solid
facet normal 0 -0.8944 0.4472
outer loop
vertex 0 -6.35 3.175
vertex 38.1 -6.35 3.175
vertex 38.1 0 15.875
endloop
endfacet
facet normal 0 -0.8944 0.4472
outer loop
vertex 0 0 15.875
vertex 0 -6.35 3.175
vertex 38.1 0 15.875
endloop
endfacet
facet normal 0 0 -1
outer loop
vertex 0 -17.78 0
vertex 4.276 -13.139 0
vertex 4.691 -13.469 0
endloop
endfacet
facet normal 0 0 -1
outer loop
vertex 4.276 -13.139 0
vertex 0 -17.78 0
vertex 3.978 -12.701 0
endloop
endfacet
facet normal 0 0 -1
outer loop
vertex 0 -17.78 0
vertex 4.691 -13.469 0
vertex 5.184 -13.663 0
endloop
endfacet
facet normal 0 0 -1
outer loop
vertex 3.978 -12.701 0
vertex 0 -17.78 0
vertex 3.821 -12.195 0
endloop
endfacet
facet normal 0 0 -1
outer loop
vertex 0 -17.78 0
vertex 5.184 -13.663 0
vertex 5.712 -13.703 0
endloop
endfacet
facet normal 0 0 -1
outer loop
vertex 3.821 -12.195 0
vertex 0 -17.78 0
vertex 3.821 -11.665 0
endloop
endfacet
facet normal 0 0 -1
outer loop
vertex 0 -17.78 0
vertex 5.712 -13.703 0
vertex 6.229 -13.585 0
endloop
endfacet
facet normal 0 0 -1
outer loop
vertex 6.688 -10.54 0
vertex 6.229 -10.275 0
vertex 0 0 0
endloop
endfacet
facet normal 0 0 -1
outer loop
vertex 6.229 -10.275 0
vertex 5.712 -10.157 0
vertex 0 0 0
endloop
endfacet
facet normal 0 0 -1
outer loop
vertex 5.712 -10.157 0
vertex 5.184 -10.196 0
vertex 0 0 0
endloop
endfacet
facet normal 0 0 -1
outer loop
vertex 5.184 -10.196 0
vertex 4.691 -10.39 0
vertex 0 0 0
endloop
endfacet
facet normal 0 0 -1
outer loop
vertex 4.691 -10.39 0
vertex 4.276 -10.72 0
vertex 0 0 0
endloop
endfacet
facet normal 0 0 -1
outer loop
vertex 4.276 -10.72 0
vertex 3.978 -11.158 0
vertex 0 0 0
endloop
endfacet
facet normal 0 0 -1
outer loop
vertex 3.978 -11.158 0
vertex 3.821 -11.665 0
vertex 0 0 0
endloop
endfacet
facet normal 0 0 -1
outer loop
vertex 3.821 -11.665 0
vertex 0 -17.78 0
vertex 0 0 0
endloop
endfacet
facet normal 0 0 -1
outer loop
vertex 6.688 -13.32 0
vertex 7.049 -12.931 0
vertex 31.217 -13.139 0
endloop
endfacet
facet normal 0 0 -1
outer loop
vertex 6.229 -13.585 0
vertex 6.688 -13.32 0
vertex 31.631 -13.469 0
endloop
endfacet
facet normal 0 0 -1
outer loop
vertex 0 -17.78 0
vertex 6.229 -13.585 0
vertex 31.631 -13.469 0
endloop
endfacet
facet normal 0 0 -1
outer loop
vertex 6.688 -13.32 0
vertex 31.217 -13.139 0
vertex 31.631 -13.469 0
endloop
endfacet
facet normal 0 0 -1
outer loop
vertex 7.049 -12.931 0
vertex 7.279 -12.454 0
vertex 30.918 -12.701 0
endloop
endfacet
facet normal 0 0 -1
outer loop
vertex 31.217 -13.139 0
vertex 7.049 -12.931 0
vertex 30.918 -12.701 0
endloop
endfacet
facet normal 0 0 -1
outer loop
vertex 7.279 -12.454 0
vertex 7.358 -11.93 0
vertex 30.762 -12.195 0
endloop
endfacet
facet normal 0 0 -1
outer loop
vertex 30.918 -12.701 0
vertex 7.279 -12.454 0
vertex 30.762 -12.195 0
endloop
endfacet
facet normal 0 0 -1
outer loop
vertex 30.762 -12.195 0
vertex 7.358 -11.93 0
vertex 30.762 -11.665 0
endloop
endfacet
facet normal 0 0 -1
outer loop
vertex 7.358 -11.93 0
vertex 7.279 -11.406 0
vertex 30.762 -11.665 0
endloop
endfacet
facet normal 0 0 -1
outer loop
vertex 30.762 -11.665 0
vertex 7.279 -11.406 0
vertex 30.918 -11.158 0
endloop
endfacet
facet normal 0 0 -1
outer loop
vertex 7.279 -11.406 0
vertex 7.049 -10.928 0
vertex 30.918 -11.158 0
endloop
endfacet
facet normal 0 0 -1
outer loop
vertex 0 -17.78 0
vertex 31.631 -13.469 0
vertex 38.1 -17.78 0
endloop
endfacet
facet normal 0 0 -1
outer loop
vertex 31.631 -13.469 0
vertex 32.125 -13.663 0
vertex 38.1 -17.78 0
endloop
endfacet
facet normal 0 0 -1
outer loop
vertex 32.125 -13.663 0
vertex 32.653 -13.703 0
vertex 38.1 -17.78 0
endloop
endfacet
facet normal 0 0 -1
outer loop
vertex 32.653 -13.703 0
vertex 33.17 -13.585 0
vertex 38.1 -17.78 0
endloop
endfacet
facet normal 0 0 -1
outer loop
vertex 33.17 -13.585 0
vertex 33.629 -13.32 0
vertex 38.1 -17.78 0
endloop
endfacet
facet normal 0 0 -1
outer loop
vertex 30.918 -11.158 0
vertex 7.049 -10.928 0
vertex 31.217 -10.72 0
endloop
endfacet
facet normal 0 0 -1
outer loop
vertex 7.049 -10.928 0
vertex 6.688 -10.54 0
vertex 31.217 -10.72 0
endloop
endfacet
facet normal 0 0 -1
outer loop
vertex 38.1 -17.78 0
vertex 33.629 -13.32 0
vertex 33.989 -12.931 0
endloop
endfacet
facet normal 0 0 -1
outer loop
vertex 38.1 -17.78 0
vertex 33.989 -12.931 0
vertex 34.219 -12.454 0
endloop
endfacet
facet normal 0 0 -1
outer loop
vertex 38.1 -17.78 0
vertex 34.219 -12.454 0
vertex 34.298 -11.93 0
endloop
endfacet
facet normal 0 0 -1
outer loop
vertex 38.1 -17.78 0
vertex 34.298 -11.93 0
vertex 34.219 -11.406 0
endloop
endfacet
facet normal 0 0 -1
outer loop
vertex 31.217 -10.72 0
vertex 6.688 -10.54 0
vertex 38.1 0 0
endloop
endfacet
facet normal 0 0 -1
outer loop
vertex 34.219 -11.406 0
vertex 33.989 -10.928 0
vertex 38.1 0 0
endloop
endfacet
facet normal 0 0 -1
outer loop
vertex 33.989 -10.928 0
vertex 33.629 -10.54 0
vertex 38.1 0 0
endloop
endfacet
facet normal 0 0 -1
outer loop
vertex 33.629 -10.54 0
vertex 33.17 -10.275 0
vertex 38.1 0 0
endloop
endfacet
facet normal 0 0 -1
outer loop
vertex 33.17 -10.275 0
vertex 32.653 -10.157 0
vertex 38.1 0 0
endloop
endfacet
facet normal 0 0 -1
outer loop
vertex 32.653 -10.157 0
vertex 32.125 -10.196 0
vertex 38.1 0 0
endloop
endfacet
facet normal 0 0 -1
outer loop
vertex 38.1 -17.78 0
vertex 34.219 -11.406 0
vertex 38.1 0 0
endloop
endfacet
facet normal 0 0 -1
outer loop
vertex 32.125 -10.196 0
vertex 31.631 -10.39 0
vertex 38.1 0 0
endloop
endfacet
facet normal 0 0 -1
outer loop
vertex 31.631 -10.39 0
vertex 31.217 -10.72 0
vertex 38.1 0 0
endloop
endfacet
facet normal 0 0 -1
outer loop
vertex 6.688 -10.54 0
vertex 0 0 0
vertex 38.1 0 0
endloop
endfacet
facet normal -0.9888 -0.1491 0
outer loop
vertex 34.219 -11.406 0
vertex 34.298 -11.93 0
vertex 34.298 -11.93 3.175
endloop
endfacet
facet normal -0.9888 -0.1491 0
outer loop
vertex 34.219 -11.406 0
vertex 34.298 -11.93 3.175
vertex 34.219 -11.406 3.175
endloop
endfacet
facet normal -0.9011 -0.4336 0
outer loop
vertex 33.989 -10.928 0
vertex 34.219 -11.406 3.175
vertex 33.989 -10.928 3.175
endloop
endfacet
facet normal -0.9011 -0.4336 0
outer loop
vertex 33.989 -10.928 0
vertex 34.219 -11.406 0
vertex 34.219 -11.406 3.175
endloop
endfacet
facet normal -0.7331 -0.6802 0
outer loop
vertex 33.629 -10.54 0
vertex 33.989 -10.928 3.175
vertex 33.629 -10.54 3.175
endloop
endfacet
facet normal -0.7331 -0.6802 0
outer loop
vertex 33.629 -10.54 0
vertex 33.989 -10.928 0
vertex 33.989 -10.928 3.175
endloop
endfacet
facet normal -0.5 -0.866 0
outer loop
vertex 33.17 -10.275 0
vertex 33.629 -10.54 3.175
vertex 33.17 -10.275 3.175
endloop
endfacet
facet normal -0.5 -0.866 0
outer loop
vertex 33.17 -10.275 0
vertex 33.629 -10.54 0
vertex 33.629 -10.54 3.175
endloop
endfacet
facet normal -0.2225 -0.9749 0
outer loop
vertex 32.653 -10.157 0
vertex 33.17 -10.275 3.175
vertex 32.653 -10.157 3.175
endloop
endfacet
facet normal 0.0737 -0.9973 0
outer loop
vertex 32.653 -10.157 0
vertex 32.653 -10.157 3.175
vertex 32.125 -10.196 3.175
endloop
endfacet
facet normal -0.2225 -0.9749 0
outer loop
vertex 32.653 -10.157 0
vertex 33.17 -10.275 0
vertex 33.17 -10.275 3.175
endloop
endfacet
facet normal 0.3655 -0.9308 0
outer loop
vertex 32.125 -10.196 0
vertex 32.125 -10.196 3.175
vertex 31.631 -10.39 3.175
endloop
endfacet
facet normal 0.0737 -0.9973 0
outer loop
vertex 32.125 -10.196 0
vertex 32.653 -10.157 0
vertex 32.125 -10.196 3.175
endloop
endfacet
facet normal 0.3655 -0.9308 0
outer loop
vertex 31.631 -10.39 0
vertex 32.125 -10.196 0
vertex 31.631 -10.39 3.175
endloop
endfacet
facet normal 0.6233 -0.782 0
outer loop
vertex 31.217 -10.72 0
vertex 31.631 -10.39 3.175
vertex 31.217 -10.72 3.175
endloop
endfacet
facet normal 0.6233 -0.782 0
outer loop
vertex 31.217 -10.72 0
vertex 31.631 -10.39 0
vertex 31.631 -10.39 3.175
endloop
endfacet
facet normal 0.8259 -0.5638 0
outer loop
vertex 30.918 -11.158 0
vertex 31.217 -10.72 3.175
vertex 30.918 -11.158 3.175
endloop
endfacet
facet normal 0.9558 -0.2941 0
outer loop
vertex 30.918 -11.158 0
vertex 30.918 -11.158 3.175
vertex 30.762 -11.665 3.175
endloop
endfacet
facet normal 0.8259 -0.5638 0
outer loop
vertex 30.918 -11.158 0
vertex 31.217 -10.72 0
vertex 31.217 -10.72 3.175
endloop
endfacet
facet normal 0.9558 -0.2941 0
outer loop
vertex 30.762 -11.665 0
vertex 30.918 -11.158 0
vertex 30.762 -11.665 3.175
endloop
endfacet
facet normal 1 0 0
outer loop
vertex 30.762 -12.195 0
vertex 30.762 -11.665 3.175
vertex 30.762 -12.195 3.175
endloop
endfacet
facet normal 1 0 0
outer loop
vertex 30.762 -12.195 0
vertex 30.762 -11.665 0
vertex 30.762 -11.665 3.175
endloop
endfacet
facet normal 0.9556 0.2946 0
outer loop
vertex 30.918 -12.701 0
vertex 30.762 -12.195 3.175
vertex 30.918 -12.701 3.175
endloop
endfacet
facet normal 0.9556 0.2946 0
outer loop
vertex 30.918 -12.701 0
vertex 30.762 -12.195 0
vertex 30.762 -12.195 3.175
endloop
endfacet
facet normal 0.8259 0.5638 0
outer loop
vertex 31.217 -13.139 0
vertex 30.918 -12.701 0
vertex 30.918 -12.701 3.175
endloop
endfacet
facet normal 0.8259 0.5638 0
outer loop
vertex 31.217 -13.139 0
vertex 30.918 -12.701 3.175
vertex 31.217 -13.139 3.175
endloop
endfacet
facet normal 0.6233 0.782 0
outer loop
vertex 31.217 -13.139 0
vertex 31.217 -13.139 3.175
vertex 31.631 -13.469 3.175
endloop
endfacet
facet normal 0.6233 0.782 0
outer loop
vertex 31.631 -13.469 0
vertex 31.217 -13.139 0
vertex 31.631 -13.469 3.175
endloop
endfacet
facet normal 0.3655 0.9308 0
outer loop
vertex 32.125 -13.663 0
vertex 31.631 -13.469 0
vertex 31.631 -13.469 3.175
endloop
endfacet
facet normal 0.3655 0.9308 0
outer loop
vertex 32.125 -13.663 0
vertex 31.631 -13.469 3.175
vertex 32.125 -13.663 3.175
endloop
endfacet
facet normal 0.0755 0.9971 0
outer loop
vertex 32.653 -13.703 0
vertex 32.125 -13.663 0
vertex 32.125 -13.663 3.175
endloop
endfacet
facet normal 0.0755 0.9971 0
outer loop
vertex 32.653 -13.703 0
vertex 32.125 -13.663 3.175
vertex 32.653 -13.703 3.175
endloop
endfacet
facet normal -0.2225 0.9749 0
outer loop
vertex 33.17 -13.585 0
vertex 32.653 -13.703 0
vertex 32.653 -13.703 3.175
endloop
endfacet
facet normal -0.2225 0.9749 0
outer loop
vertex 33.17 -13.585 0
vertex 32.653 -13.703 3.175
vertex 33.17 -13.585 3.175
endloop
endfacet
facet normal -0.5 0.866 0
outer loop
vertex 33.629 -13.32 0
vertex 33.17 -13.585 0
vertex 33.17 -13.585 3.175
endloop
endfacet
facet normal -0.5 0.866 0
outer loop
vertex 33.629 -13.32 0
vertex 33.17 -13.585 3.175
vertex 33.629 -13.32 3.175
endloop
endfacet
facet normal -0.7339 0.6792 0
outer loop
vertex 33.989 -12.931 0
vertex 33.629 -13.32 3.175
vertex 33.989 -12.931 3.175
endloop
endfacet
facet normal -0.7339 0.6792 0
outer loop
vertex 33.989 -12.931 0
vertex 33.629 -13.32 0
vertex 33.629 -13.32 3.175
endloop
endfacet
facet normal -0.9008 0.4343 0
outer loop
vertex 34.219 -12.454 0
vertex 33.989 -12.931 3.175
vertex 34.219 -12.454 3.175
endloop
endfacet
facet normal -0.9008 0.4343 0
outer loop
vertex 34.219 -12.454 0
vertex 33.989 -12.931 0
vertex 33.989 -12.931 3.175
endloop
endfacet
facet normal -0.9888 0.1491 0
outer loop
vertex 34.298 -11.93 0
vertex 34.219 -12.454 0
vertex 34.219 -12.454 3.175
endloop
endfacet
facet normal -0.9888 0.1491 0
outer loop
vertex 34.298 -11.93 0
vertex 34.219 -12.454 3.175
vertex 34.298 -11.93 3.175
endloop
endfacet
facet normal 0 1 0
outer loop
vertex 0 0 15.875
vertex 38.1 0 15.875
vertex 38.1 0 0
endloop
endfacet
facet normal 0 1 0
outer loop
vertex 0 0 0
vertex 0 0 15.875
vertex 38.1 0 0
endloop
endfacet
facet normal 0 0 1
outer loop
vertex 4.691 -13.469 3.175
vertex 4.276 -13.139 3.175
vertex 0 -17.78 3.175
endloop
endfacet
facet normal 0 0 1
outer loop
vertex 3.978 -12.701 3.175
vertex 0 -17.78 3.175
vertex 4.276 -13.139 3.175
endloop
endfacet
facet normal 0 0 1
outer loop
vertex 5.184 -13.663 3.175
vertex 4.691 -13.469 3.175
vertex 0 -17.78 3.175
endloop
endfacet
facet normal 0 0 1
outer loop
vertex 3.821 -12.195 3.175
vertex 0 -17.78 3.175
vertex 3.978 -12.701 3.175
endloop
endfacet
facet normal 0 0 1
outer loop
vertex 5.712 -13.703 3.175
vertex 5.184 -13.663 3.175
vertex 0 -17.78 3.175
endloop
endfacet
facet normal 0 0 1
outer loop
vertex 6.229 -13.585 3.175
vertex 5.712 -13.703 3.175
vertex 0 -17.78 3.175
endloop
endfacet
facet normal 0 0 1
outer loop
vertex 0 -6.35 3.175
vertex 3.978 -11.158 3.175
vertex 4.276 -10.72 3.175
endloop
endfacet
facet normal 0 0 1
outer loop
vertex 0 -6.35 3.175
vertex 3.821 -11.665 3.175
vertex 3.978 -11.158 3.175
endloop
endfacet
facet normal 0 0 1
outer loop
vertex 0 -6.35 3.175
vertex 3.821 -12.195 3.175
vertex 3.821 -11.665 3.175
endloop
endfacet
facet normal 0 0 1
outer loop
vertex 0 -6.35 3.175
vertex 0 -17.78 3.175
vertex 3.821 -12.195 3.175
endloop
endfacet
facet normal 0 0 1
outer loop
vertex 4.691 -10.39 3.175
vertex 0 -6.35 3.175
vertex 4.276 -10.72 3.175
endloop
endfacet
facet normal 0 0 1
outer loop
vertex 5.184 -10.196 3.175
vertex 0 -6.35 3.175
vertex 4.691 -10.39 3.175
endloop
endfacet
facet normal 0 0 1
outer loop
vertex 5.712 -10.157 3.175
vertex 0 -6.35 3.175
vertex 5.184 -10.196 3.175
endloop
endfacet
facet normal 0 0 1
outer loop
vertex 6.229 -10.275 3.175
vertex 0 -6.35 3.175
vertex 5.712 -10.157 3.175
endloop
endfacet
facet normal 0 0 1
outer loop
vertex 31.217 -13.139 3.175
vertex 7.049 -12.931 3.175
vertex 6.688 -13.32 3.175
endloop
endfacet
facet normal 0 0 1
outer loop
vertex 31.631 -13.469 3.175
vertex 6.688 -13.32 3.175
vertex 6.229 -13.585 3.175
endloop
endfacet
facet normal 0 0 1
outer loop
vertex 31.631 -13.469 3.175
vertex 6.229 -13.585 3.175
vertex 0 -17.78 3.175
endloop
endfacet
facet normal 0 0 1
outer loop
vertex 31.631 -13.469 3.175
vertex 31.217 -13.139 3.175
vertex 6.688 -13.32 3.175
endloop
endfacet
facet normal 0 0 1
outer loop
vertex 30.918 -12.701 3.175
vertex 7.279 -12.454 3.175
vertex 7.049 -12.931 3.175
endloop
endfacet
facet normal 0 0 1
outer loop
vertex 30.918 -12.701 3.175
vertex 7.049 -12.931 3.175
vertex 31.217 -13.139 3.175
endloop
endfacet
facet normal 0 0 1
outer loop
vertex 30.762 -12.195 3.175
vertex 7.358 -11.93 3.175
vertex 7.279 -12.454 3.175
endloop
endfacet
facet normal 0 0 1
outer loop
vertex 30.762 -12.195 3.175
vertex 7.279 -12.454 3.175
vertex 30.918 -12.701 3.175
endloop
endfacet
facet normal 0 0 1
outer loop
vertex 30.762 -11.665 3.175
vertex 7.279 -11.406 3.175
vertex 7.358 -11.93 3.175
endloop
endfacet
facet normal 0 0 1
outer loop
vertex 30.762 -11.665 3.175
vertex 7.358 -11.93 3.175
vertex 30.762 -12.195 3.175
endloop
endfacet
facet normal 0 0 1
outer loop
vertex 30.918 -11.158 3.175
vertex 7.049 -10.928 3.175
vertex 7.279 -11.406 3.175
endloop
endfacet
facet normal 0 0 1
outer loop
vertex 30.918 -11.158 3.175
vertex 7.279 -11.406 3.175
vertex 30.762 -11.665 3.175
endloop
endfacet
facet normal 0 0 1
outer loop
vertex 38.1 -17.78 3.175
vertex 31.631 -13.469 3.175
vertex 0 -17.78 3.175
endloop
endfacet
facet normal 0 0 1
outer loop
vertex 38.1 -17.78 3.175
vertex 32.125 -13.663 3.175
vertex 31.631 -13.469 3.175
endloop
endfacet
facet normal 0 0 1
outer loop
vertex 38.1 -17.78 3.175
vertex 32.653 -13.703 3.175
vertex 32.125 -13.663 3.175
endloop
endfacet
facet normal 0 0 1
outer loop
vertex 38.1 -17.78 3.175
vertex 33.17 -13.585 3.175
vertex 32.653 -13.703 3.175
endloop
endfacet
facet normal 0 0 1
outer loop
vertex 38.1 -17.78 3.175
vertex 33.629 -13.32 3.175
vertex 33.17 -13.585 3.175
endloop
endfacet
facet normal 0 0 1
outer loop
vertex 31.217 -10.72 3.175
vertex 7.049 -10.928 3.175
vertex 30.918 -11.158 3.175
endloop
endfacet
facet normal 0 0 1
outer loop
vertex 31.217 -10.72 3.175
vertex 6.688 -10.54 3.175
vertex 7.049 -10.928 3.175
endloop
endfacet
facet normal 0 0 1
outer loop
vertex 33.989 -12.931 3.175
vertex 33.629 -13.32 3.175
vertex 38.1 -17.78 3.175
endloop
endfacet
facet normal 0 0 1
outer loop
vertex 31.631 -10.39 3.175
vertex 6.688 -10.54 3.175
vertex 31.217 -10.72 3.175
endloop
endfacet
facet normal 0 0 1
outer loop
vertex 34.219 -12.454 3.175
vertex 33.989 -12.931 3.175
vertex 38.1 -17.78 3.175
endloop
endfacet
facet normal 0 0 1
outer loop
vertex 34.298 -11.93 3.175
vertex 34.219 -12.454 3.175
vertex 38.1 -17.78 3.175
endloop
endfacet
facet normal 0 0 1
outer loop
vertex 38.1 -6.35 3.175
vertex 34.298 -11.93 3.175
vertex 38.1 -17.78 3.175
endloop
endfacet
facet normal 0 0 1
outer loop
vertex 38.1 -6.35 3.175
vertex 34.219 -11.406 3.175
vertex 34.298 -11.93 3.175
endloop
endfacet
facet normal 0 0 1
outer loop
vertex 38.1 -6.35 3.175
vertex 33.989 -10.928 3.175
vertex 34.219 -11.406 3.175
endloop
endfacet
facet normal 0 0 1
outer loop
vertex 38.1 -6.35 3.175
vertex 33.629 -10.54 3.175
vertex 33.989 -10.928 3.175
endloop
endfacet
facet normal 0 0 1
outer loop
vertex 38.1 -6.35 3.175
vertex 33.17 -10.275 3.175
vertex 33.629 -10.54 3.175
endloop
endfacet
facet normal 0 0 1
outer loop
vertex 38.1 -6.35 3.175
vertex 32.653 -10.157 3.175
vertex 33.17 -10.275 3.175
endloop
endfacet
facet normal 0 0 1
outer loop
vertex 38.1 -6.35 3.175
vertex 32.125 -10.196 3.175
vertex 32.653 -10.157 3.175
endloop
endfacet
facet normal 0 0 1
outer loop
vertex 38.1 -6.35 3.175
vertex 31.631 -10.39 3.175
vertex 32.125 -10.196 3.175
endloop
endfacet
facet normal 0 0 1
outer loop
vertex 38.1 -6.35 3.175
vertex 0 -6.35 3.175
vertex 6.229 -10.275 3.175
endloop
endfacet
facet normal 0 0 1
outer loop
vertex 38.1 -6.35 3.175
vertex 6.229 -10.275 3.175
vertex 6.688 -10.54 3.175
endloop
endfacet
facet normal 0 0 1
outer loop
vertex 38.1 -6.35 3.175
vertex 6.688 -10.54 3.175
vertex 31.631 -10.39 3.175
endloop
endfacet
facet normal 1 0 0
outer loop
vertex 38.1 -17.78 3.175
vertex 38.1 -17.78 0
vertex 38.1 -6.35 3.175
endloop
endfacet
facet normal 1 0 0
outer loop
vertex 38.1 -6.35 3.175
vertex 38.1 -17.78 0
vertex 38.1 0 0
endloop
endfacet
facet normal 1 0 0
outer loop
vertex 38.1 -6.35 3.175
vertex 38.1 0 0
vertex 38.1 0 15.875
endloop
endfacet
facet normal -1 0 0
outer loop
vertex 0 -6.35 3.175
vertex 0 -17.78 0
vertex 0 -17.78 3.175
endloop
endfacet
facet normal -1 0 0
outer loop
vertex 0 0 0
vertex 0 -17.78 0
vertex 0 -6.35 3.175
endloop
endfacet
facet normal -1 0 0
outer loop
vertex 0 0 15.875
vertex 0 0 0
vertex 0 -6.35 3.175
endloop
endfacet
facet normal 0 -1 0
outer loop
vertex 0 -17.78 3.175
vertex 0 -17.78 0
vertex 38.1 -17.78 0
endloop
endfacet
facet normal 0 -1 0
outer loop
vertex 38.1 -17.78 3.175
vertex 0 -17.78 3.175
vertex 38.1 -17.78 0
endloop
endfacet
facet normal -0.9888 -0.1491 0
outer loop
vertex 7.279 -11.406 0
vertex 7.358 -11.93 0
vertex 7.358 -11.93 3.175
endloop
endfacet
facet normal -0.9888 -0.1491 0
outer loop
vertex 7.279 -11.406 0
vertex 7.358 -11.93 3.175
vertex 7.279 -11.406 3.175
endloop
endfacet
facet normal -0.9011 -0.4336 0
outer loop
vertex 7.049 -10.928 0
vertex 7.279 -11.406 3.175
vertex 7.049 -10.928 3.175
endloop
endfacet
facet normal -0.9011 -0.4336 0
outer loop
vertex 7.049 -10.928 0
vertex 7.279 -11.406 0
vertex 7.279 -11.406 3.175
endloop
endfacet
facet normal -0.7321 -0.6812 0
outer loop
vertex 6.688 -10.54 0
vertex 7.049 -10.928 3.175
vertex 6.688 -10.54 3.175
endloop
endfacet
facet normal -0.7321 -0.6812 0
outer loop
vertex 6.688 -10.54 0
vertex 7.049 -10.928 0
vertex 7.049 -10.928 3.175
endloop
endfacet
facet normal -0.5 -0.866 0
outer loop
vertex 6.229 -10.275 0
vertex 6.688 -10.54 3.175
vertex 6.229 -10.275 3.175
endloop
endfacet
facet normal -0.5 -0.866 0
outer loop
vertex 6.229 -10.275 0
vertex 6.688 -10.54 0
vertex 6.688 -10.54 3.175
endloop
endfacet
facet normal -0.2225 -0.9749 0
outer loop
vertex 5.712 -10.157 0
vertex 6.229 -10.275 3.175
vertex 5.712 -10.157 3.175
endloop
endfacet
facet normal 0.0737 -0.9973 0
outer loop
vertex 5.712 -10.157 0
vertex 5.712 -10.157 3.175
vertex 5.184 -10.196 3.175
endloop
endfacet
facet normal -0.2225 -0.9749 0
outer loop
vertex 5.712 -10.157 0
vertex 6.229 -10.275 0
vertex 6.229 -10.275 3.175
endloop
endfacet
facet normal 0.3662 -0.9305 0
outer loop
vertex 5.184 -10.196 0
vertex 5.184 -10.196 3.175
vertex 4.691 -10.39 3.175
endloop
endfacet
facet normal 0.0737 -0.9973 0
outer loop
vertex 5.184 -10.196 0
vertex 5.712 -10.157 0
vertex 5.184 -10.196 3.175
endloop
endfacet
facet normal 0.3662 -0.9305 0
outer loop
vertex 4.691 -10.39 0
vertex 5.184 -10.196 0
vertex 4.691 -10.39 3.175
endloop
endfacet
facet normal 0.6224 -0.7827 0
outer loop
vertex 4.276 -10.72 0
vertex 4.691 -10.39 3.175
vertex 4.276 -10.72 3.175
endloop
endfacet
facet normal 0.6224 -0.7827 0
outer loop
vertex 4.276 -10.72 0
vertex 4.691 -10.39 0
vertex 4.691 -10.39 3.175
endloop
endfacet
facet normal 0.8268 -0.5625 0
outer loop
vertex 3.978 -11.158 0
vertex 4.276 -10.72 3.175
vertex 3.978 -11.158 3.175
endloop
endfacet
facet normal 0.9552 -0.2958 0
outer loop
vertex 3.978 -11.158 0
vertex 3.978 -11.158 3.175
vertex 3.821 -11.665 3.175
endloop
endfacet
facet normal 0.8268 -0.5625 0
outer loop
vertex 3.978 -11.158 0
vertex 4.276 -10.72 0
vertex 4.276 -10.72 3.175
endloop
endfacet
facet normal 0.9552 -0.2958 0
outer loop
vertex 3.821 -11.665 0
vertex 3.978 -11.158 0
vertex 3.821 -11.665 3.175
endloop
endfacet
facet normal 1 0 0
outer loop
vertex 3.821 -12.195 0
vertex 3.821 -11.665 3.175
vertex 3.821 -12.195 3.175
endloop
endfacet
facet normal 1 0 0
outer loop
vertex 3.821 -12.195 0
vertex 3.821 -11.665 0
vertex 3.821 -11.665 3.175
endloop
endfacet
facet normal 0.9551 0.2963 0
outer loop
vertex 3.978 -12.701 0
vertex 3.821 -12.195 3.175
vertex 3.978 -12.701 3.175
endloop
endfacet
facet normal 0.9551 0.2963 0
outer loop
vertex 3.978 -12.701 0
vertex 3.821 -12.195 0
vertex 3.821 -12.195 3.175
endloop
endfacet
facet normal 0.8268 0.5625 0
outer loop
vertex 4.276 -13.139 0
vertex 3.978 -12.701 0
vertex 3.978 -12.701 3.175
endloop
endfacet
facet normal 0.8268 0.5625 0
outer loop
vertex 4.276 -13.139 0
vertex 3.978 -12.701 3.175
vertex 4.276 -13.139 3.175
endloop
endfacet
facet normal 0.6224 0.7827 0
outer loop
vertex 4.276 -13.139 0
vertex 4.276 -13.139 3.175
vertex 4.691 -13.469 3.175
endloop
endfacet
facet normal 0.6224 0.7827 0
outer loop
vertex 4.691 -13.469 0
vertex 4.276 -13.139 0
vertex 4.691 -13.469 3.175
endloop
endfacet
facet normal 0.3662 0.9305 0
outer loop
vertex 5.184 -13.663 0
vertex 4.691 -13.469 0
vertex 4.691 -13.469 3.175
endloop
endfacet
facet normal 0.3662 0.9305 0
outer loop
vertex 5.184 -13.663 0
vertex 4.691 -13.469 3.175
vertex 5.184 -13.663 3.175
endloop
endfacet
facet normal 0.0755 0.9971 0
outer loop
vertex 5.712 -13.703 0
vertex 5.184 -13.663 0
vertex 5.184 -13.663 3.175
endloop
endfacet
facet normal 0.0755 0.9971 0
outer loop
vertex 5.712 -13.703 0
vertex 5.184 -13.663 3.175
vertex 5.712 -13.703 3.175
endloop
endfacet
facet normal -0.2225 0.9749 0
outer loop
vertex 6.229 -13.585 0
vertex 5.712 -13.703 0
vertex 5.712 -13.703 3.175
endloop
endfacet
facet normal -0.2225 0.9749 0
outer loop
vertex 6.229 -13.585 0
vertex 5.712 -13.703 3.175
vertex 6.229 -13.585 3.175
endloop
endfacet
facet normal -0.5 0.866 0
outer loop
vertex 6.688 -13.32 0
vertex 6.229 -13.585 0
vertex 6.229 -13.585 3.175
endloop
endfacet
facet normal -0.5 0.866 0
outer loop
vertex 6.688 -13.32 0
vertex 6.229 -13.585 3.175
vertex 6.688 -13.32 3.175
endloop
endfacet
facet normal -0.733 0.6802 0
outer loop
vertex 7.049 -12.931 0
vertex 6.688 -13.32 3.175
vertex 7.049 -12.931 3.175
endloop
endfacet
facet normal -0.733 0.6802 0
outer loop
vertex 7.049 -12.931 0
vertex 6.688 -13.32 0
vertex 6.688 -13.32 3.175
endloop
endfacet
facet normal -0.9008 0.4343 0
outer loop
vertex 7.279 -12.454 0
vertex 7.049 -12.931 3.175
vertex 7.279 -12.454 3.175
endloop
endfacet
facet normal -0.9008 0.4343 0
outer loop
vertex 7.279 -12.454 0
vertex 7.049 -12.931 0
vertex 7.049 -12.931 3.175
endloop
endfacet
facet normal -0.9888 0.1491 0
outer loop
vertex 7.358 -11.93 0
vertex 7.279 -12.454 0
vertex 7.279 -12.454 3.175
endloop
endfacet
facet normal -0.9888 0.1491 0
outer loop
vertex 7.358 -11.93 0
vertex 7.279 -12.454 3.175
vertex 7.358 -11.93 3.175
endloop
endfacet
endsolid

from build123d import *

# Parameters (mm, degrees)
SKETCH1_W           = 38.1
SKETCH1_H           = 17.78
SKETCH1_R           = 1.778
BOSS_EXTRUDE2_DEPTH = 3.175
BOSS_EXTRUDE3_DEPTH = 38.1


with BuildPart() as part:
    # Sketch1 → Boss-Extrude2 (new body)
    with BuildSketch(Plane.XY):
        with Locations((19.05, -8.89)):
            Rectangle(SKETCH1_W, SKETCH1_H)
        with Locations((5.579618, -11.929615714)):
            Circle(SKETCH1_R, mode=Mode.SUBTRACT)
        with Locations((32.520382, -11.929615714)):
            Circle(SKETCH1_R, mode=Mode.SUBTRACT)
    extrude(amount=BOSS_EXTRUDE2_DEPTH)

    # Sketch4 → Boss-Extrude3 (add)
    with BuildSketch(Plane(origin=(38.1, 0, 0), x_dir=(0, 0, -1), z_dir=(1, 0, 0))):
        Polygon((-3.175, -6.35), (-15.875, 0), (-3.175, 0), align=None)
    extrude(amount=-BOSS_EXTRUDE3_DEPTH)


solid = part.part
